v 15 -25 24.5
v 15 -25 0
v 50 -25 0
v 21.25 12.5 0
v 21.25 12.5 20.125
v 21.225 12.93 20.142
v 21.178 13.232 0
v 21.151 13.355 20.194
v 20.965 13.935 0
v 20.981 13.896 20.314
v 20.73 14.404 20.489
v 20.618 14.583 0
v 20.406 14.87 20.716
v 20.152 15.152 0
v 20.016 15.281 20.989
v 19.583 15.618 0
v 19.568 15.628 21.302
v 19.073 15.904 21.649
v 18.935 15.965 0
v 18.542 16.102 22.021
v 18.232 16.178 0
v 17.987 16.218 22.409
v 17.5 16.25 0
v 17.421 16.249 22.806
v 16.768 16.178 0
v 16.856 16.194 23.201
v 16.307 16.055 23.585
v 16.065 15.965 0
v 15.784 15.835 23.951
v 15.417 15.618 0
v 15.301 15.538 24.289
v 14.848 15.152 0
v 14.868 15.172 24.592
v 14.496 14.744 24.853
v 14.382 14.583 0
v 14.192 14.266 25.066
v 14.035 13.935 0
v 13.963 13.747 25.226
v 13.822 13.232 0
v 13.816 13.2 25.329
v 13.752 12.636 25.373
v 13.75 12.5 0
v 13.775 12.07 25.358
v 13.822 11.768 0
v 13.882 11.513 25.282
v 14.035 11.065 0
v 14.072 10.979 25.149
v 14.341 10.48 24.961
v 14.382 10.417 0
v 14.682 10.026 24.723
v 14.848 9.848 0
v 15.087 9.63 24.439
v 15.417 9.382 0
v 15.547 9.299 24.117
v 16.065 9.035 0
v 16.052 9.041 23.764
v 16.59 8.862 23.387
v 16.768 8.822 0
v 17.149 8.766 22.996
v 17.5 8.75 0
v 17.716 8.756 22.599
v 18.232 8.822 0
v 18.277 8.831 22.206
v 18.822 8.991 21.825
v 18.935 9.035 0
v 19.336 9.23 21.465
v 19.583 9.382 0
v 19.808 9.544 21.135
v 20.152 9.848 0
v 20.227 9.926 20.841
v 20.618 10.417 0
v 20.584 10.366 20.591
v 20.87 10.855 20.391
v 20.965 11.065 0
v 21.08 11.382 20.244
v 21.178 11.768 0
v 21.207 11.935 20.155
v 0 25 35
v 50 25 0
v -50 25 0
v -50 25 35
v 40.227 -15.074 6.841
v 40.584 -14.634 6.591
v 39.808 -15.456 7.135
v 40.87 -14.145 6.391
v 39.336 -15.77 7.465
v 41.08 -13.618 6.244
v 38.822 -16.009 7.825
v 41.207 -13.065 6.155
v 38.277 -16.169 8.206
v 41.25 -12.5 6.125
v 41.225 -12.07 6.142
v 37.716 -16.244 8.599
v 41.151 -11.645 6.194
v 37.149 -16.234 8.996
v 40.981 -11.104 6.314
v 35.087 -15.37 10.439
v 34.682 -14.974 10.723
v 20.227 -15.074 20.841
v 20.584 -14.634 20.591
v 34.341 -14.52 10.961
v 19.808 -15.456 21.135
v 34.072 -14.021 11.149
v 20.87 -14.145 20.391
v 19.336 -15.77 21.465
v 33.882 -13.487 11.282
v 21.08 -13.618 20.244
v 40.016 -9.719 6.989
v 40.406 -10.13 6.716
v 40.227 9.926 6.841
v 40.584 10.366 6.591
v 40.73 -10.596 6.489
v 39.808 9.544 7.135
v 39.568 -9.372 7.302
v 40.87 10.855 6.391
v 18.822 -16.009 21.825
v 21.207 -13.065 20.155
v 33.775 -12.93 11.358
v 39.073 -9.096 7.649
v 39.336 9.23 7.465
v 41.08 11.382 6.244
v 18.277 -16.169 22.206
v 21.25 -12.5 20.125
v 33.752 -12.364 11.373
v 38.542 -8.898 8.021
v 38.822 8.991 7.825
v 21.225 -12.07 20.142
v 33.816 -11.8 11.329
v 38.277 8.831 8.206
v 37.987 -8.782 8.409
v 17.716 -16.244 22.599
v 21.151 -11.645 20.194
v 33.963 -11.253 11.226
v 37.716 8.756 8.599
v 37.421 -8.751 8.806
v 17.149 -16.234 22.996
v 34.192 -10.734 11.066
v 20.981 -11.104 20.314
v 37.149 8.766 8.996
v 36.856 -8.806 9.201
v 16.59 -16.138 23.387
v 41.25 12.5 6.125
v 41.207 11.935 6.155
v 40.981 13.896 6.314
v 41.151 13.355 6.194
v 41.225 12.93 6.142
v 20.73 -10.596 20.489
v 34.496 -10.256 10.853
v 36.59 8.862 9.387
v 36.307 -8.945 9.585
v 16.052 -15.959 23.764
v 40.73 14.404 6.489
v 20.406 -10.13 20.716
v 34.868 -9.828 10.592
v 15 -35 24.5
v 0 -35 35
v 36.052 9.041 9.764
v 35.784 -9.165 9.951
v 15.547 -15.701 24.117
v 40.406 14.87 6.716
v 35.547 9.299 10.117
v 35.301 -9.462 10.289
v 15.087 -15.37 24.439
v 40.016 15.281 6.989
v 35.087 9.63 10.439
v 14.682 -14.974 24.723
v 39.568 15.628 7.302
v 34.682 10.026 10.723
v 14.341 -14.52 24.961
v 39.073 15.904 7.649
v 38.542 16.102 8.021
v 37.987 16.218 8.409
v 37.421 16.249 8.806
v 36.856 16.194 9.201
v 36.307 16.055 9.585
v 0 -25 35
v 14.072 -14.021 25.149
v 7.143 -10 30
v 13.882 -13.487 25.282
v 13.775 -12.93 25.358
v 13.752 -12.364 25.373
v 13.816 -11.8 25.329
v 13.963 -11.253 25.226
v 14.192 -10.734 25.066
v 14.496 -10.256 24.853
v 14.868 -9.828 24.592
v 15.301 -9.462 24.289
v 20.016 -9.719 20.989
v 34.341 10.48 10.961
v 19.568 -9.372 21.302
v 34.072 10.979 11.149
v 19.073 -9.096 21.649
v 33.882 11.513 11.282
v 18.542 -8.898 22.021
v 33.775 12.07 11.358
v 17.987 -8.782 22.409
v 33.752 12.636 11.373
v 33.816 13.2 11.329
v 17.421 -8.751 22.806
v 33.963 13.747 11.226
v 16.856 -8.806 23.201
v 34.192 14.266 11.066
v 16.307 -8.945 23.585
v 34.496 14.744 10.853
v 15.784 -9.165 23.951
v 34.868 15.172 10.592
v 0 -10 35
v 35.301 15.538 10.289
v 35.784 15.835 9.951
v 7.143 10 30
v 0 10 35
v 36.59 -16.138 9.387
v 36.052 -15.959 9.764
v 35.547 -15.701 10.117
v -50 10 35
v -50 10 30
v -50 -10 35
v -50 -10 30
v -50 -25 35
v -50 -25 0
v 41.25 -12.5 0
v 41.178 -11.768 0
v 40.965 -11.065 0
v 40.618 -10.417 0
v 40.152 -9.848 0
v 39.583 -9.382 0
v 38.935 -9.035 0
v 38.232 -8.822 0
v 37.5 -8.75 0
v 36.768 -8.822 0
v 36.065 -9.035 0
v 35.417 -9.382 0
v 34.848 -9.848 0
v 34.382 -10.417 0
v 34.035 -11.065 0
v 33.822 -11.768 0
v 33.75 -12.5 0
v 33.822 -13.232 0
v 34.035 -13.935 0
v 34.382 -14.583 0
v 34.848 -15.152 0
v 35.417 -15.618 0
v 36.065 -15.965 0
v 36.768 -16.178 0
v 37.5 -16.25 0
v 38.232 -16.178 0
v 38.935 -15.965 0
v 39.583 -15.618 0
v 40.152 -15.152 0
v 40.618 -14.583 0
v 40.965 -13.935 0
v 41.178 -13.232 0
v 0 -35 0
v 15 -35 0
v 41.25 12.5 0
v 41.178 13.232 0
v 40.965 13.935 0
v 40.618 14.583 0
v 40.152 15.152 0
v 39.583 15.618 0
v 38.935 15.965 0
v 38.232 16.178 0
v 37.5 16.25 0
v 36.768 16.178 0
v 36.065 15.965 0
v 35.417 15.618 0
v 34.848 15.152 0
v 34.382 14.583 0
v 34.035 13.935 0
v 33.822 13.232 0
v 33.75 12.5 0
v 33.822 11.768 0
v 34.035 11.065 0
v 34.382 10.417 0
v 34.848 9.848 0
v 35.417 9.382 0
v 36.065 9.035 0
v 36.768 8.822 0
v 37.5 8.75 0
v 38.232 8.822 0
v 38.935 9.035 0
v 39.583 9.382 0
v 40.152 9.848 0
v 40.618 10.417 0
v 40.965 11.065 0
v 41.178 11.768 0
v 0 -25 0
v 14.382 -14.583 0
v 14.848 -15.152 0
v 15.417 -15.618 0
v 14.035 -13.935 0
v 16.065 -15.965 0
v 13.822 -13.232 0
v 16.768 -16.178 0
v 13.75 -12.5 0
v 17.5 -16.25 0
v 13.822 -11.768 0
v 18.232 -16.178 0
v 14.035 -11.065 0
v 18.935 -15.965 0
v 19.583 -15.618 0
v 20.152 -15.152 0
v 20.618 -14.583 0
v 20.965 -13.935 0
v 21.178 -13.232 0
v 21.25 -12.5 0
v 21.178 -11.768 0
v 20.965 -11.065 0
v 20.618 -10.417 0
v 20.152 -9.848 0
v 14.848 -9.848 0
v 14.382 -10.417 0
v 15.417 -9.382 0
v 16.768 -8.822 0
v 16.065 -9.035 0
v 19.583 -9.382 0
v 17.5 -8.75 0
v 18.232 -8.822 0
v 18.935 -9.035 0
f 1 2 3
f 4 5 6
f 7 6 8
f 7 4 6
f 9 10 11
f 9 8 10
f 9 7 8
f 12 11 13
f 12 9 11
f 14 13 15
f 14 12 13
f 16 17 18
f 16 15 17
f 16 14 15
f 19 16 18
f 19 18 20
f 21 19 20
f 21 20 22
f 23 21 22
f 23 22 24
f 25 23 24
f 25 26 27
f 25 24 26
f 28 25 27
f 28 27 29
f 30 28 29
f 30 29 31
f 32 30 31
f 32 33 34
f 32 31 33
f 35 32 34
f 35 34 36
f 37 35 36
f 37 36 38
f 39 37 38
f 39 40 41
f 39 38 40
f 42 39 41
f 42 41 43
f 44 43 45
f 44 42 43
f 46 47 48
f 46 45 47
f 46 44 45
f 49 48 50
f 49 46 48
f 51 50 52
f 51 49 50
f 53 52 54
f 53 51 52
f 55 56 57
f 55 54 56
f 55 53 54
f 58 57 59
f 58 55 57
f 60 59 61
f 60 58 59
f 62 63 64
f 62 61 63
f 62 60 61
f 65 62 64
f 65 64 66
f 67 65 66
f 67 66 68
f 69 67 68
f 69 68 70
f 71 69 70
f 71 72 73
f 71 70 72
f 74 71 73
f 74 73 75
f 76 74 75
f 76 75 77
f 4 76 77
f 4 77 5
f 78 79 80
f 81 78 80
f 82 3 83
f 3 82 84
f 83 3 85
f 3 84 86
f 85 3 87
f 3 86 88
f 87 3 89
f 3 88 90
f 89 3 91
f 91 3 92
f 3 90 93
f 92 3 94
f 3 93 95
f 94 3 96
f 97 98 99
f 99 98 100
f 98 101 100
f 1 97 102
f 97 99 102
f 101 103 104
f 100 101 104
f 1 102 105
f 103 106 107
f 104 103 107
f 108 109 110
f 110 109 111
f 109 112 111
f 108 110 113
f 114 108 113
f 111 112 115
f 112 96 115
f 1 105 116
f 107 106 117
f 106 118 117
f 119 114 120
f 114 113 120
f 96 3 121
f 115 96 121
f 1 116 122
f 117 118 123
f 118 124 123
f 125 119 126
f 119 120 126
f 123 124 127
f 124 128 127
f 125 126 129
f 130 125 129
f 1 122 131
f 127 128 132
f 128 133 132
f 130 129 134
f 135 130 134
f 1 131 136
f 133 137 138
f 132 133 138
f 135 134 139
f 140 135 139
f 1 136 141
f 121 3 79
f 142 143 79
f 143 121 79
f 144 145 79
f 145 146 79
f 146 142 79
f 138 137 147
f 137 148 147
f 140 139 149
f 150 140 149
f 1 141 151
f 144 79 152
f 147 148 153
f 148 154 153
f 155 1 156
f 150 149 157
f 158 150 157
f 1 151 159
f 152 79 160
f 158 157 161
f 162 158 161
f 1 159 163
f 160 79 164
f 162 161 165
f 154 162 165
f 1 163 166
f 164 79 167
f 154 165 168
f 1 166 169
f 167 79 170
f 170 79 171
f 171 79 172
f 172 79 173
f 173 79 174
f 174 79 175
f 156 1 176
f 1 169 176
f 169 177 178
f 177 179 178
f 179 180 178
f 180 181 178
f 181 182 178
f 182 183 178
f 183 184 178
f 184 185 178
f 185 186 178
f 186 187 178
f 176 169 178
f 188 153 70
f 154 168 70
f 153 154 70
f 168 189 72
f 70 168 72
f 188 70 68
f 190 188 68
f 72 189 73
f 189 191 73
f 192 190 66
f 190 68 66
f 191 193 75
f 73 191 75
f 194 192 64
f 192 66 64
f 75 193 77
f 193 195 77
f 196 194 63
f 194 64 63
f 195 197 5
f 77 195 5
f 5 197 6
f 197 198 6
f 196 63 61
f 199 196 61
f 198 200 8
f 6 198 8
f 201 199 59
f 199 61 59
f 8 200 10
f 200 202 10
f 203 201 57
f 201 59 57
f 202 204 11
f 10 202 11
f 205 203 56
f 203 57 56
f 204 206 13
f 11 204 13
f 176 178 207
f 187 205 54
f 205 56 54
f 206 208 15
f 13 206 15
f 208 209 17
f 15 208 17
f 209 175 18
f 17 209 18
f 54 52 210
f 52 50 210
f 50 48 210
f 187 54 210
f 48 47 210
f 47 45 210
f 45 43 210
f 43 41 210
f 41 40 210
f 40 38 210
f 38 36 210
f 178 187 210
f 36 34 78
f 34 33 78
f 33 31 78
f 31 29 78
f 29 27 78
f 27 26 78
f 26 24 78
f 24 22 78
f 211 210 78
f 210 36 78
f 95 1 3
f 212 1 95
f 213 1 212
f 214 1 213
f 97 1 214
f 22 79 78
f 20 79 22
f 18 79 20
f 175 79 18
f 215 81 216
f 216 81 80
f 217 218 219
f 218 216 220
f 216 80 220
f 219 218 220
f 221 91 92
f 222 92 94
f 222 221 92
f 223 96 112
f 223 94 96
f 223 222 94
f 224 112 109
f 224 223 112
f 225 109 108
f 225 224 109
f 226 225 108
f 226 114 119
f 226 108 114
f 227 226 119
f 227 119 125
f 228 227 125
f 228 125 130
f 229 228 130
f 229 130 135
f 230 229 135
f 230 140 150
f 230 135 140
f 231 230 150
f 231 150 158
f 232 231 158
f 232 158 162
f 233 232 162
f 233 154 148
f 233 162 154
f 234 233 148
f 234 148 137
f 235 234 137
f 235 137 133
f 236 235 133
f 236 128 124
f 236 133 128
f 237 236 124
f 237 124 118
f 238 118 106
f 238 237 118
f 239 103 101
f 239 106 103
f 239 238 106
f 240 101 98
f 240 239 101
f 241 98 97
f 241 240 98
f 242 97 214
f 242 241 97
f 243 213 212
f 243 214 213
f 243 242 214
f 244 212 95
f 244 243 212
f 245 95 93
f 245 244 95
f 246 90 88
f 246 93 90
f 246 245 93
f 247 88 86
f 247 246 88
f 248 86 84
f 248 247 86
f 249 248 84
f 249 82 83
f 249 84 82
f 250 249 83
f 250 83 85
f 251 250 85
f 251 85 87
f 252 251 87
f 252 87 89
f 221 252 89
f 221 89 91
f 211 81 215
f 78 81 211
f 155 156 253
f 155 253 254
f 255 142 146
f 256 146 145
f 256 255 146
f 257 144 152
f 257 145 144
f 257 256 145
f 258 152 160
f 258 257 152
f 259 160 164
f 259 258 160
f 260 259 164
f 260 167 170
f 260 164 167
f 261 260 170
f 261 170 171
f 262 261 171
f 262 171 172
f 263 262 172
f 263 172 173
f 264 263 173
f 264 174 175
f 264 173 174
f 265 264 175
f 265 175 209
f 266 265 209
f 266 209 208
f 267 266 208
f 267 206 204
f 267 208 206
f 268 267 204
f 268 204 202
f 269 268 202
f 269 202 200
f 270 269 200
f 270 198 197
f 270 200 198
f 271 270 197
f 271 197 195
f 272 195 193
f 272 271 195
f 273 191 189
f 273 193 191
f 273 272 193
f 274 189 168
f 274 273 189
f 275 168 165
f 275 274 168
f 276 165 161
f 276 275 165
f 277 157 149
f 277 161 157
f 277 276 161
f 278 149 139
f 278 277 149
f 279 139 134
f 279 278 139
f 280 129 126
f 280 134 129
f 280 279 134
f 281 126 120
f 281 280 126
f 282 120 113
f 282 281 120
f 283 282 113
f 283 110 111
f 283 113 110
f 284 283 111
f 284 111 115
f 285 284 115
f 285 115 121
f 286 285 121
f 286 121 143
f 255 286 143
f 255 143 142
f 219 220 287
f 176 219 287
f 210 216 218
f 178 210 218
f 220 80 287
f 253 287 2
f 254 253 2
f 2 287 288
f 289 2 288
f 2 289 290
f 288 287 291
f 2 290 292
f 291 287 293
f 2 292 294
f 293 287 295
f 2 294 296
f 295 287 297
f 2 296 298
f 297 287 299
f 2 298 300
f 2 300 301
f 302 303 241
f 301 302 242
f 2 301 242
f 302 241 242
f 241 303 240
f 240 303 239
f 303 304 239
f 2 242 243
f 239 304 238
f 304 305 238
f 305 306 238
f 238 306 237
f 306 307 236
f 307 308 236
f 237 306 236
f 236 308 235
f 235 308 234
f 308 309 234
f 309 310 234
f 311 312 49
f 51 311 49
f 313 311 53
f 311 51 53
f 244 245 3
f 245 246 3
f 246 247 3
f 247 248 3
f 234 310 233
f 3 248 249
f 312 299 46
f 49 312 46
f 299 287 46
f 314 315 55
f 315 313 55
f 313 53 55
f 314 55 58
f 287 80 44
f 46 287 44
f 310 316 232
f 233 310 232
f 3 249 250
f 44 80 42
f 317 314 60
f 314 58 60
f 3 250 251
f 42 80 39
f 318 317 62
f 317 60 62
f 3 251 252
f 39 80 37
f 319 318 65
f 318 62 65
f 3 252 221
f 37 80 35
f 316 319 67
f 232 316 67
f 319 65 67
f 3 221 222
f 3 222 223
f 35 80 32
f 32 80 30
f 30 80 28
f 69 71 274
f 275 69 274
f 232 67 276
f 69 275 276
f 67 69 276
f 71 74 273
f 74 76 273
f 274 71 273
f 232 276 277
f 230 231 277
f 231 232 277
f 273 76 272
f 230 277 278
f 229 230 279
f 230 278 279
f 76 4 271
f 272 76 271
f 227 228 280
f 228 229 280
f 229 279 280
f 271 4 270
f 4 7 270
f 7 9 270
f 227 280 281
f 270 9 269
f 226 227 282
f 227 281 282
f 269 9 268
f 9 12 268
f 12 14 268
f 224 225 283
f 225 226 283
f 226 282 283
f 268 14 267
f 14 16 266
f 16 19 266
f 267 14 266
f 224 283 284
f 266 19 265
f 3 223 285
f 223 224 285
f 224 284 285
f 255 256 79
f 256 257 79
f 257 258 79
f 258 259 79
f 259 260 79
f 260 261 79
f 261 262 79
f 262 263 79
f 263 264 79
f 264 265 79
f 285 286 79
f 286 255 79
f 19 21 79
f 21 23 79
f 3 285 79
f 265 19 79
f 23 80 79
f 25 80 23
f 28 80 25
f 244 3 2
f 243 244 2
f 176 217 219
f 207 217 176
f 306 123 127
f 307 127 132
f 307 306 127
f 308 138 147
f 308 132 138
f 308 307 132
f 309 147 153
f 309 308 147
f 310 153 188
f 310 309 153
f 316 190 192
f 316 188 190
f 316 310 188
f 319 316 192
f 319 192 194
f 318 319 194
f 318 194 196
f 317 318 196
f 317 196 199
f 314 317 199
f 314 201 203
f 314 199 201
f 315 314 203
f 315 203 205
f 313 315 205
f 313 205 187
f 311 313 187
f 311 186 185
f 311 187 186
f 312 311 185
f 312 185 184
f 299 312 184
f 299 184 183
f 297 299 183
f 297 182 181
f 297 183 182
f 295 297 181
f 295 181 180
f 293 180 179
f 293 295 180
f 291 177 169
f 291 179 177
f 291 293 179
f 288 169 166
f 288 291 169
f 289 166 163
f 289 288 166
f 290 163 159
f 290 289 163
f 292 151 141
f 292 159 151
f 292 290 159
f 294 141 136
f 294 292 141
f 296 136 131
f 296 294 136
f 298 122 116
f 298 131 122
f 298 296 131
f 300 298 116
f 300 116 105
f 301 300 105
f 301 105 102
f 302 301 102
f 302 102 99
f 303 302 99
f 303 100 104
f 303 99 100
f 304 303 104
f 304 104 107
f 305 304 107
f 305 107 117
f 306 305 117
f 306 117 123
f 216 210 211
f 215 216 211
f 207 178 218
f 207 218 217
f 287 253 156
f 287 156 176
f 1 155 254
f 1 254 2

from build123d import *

# Parameters (mm, degrees)
F0_R     = 3.75
F0_W     = 15
F0_H     = 10
F1_DEPTH = 35
F3_DEPTH = 60.001
F4_W     = 20
F4_H     = 5
F5_DEPTH = 100.001


with BuildPart() as f1:
    # F0 (on Top) → F1 (new body)
    with BuildSketch(Plane.XY):
        Polygon((50, 25), (-50, 25), (-50, -25), (0, -25), (15, -25), (50, -25), align=None)
        with Locations((17.5, -12.5)):
            Circle(F0_R, mode=Mode.SUBTRACT)
        with Locations((37.5, -12.5)):
            Circle(F0_R, mode=Mode.SUBTRACT)
        with Locations((17.5, 12.5)):
            Circle(F0_R, mode=Mode.SUBTRACT)
        with Locations((37.5, 12.5)):
            Circle(F0_R, mode=Mode.SUBTRACT)
        with Locations((7.5, -30)):
            Rectangle(F0_W, F0_H)
    extrude(amount=F1_DEPTH)

    # F2 (on face) → F3 (cut, through all)
    with BuildSketch(Plane(origin=(0, 25, 0), x_dir=(-1, 0, 0), z_dir=(0, 1, 0))):
        Polygon((-50, 35), (-50, 0), (0, 35), align=None)
    extrude(amount=-F3_DEPTH, mode=Mode.SUBTRACT)

    # F4 (on face) → F5 (cut, through all)
    with BuildSketch(Plane(origin=(-50, 0, 0), x_dir=(0, -1, 0), z_dir=(-1, 0, 0))):
        with Locations((0, 32.5)):
            Rectangle(F4_W, F4_H)
    extrude(amount=-F5_DEPTH, mode=Mode.SUBTRACT)


solid = f1.part
